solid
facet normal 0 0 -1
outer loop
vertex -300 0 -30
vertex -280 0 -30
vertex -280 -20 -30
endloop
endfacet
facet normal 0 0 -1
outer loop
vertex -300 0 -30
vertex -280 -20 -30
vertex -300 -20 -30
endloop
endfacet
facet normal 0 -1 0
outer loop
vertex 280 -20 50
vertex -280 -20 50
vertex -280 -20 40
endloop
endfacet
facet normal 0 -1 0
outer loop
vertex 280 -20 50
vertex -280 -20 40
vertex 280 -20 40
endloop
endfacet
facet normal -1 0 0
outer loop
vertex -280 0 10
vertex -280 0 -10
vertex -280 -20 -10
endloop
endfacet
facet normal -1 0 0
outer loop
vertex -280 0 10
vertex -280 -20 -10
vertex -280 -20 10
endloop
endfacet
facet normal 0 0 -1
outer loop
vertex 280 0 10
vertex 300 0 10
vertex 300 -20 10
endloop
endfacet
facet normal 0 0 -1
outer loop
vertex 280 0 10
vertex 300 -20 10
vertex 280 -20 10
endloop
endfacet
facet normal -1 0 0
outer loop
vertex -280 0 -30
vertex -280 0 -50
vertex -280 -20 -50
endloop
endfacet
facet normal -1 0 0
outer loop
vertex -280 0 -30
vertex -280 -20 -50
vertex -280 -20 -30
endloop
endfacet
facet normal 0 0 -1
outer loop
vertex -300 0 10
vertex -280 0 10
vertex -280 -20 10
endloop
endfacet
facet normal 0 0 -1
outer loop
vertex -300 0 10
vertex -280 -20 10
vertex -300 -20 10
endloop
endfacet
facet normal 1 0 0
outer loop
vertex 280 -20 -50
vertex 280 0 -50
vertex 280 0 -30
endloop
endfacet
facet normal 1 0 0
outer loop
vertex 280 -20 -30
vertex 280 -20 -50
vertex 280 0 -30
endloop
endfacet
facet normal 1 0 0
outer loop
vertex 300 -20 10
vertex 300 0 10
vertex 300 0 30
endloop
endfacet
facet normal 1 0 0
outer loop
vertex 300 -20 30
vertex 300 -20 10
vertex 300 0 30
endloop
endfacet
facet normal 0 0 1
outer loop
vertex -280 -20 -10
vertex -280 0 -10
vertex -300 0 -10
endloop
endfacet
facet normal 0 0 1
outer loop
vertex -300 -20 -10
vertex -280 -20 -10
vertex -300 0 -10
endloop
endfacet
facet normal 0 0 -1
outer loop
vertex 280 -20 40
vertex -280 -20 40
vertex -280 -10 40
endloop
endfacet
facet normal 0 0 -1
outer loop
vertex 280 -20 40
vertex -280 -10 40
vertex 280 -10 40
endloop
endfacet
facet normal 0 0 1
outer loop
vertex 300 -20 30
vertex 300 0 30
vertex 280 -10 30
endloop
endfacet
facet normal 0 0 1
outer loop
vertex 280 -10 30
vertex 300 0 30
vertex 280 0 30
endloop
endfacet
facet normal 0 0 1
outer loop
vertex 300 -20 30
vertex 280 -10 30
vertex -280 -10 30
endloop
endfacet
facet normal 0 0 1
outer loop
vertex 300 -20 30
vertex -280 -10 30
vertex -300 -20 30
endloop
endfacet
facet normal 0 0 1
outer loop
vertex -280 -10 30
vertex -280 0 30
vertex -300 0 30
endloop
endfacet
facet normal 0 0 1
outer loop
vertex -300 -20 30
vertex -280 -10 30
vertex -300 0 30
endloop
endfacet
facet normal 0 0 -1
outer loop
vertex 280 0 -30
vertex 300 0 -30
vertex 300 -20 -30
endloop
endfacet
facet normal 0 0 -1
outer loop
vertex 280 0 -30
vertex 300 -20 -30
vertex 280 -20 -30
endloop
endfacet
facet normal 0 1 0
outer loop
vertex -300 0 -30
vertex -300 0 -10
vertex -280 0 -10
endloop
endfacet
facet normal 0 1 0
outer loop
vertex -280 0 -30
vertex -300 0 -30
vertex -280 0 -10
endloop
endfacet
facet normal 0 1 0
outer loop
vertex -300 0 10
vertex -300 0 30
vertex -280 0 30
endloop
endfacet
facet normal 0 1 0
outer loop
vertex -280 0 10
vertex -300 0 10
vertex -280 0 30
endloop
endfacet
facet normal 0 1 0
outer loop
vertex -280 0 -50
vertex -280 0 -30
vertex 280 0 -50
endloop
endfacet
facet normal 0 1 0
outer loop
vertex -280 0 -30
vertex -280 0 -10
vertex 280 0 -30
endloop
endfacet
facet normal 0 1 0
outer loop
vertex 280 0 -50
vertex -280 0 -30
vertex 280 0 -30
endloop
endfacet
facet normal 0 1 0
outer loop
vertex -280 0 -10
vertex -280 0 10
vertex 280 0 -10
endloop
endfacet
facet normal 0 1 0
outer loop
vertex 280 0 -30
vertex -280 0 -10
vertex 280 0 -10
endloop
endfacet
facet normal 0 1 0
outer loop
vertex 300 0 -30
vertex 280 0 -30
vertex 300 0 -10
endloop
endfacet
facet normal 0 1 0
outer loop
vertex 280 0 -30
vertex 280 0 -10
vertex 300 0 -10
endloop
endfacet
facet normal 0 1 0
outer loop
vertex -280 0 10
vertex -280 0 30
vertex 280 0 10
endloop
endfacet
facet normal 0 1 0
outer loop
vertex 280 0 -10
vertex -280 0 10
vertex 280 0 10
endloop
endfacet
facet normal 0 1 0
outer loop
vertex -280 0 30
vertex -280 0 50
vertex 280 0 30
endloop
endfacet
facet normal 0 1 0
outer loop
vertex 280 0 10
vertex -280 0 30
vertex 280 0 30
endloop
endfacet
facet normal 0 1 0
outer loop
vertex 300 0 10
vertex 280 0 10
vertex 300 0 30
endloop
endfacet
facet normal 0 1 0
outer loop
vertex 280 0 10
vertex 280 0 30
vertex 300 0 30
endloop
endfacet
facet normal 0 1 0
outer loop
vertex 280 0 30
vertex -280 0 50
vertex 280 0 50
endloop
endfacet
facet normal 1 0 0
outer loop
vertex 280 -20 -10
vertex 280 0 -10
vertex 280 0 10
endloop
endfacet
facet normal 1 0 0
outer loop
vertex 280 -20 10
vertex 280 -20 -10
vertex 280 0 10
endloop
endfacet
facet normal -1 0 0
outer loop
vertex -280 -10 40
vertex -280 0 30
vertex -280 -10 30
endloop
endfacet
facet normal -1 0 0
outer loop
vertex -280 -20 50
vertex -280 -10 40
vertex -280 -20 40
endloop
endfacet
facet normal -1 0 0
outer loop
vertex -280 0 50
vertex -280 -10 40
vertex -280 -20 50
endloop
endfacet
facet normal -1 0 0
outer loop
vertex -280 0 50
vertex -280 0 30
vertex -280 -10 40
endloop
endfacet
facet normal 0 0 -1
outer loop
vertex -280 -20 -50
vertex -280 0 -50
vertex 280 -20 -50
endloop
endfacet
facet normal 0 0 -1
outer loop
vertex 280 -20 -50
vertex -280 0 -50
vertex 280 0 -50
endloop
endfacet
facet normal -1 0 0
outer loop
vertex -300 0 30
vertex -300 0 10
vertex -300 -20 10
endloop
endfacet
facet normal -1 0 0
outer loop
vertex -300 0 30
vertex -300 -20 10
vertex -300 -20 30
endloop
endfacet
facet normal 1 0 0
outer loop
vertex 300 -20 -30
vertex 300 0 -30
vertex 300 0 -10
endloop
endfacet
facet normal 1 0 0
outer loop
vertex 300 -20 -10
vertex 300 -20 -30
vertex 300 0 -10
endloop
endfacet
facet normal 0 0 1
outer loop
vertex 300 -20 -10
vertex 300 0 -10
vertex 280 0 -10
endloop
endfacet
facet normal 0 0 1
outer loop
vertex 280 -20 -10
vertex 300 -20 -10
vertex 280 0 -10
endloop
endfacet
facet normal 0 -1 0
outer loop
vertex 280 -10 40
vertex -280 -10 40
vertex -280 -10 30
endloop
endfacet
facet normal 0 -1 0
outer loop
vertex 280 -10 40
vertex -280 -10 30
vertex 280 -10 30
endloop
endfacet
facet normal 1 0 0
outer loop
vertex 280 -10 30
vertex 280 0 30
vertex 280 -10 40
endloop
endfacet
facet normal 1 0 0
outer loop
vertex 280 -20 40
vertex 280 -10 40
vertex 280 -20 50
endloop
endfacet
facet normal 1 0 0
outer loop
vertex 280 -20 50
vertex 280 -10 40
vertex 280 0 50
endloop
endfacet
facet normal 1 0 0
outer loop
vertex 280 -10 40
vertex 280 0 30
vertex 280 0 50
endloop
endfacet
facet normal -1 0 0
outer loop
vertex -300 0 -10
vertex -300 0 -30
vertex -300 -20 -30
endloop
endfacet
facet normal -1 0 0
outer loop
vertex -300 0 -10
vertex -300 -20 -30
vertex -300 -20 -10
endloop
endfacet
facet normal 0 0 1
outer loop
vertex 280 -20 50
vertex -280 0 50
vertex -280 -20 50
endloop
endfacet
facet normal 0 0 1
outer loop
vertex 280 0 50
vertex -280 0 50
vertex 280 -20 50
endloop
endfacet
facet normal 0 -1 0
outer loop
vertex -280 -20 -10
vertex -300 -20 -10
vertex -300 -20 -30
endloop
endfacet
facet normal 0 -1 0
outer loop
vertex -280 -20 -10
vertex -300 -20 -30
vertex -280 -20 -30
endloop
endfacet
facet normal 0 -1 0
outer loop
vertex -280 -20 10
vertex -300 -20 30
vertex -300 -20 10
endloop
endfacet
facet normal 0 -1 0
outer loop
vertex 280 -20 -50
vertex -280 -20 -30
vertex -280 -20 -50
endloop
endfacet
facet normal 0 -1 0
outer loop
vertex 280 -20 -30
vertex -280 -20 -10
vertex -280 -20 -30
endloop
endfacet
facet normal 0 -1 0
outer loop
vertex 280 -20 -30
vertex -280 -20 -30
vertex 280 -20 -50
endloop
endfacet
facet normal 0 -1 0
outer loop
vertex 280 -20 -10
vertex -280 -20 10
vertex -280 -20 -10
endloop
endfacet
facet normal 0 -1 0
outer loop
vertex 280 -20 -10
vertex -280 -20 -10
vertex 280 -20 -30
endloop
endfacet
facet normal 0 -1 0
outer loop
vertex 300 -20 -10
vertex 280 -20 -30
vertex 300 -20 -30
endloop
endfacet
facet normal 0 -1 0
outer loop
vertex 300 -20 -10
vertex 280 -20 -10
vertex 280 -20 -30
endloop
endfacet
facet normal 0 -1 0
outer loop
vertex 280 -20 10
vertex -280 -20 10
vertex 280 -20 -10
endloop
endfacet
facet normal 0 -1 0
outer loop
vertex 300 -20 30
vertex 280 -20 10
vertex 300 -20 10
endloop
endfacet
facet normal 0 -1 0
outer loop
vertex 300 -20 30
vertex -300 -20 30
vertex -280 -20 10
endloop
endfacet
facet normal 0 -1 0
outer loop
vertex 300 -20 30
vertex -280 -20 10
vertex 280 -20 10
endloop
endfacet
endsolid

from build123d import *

# Parameters (mm, degrees)
F0_W     = 600
F0_H     = 100
F1_DEPTH = 20
F2_W     = 20
F2_H     = 20
F3_DEPTH = 20
F4_W     = 600
F4_H     = 10
F5_DEPTH = 10


with BuildPart() as f1:
    # F0 (on Front) → F1 (new body)
    with BuildSketch(Plane.XZ):
        Rectangle(F0_W, F0_H)
    extrude(amount=F1_DEPTH)

    # F2 (on face) → F3 (cut, through all)
    with BuildSketch(Plane(origin=(0, 0, 0), x_dir=(-1, 0, 0), z_dir=(0, 1, 0))):
        with Locations((-290, -40)):
            Rectangle(F2_W, F2_H)
        with Locations((-290, 0)):
            Rectangle(F2_W, F2_H)
        with Locations((290, 0)):
            Rectangle(F2_W, F2_H)
        with Locations((290, -40)):
            Rectangle(F2_W, F2_H)
        with Locations((290, 40)):
            Rectangle(F2_W, F2_H)
        with Locations((-290, 40)):
            Rectangle(F2_W, F2_H)
    extrude(amount=-F3_DEPTH, mode=Mode.SUBTRACT)

    # F4 (on face) → F5 (cut)
    with BuildSketch(Plane.XZ.offset(20)):
        with Locations((0, 35)):
            Rectangle(F4_W, F4_H)
    extrude(amount=-F5_DEPTH, mode=Mode.SUBTRACT)


solid = f1.part
